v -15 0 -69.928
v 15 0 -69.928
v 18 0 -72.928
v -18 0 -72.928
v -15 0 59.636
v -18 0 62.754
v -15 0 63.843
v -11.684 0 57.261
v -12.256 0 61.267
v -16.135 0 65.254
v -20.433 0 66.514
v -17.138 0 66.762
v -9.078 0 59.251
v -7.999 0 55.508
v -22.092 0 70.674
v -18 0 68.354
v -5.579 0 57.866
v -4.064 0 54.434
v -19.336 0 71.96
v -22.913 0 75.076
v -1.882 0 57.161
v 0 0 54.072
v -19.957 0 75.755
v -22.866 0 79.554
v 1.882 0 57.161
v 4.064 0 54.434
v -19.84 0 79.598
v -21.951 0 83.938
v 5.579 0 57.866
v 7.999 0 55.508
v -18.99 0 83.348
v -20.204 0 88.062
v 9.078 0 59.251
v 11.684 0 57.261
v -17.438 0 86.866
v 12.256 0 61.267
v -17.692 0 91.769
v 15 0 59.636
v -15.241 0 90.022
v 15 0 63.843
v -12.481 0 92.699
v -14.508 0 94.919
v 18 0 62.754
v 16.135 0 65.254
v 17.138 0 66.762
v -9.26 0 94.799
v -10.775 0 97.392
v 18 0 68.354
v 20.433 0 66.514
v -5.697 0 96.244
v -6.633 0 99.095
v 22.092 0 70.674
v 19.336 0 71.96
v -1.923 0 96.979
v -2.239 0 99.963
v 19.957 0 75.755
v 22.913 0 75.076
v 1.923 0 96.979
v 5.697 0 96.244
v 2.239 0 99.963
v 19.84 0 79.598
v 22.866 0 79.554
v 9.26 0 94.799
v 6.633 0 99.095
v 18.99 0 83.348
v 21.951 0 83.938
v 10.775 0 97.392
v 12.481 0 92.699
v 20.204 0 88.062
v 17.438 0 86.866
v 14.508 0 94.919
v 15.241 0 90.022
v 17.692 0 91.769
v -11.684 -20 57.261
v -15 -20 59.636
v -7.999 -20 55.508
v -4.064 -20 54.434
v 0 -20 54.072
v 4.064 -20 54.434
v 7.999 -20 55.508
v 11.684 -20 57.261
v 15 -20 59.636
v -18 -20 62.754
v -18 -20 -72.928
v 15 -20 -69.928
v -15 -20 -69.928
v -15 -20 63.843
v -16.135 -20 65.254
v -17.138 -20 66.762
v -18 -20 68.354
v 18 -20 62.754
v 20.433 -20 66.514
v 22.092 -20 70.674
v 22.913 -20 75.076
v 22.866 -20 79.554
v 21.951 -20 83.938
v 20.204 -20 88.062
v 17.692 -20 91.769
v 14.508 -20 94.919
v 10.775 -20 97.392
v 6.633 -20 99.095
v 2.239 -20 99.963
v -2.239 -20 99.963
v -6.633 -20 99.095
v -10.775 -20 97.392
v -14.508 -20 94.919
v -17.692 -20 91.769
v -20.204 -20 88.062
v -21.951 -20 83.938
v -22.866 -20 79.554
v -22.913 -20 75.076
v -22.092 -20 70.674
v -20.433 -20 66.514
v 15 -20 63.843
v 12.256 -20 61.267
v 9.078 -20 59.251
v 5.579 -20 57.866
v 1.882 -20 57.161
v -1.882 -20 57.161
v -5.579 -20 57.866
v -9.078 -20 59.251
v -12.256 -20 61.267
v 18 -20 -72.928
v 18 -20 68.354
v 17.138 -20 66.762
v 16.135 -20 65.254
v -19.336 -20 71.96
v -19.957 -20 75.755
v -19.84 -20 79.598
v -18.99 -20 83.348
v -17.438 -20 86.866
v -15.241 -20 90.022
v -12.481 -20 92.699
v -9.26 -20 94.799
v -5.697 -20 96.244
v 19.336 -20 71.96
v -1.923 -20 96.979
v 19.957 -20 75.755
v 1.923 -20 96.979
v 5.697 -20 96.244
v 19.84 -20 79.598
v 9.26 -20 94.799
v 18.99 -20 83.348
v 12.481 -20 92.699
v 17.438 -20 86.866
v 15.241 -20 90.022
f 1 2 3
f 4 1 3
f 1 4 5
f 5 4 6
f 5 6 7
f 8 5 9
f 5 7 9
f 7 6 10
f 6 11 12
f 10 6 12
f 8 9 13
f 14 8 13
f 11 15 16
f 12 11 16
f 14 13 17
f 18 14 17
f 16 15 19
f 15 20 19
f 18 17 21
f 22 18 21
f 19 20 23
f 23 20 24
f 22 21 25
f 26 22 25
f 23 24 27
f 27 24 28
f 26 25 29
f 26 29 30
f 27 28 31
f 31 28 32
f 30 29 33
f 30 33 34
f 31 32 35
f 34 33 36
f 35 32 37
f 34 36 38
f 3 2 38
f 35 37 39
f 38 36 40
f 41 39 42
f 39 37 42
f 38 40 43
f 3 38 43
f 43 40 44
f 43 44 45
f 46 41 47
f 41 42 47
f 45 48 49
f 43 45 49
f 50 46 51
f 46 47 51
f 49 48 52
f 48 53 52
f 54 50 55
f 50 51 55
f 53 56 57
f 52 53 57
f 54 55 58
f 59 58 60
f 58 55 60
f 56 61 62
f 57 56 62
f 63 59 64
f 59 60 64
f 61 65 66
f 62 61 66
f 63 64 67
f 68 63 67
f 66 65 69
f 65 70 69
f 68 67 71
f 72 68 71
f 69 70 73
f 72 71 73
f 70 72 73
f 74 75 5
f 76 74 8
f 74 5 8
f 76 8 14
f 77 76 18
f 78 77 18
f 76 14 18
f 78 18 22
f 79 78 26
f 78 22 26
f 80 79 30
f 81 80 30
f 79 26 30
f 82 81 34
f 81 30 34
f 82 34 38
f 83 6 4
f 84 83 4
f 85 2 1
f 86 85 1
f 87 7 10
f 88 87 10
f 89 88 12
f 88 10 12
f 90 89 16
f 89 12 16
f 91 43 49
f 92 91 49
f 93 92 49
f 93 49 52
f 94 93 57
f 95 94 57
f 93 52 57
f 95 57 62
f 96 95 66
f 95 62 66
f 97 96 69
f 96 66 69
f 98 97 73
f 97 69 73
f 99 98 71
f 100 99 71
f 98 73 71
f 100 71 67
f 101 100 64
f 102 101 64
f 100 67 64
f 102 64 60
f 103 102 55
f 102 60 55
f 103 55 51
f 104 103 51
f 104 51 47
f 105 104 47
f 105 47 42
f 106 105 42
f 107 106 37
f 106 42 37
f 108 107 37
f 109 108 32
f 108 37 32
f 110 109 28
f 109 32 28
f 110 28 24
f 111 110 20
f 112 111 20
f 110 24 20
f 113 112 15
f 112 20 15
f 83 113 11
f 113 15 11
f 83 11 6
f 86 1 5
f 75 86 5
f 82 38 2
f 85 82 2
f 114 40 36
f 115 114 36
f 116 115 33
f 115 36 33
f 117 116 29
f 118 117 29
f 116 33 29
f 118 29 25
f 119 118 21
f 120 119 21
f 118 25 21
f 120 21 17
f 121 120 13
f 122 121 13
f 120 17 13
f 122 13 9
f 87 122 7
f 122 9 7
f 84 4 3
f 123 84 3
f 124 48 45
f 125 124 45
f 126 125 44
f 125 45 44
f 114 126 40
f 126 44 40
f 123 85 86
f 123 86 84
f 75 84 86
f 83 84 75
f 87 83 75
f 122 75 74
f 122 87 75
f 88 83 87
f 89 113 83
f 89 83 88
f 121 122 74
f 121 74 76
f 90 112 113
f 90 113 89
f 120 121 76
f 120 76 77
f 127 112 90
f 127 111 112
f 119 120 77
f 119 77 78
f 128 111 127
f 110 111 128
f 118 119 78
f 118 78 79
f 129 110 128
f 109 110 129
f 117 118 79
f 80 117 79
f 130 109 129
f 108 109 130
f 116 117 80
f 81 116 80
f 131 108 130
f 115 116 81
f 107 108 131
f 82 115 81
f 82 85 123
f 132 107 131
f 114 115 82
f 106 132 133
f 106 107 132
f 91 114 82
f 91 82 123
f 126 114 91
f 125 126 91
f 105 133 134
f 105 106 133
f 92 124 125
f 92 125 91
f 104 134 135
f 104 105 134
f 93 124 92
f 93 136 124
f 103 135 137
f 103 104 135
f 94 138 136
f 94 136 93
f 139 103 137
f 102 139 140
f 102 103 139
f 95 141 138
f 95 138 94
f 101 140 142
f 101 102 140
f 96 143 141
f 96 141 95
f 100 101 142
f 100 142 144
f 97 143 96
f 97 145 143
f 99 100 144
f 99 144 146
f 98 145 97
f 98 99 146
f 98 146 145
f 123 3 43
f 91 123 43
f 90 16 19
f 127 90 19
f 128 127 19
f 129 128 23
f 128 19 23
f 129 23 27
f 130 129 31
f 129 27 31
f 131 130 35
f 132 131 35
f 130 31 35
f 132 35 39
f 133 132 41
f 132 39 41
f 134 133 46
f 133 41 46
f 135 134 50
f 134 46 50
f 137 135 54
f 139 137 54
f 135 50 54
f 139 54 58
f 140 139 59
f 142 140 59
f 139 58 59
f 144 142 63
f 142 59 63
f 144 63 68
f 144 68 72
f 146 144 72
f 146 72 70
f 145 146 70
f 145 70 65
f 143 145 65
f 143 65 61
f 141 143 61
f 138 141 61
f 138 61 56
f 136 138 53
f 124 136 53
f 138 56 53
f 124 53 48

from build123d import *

# Parameters (mm, degrees)
F1_DEPTH = 20


# Not quite as in the source:
# - a feature names something its author has since deleted; it is built from what else it names


with BuildPart() as f1:
    # F0 (on Front) → F1 (new body)
    with BuildSketch(Plane.XZ):
        with BuildLine():
            ThreePointArc((-18, 68.354232338), (-4.472135955, 96.5656189147), (20, 77.072030225))
            ThreePointArc((20, 77.072030225), (19.4935886896, 72.59989427), (18, 68.354232338))
            Line((18, 68.354232338), (18, 62.7542091618))
            ThreePointArc((18, 62.7542091618), (21.7140507506, 69.489154781), (23, 77.072030225))
            ThreePointArc((23, 77.072030225), (-7.5828754441, 98.7860809757), (-18, 62.7542091618))
            Line((-18, 62.7542091618), (-18, 68.354232338))
        make_face()
        with BuildLine():
            ThreePointArc((-15, 63.8432736697), (-16.6534436987, 65.9967057163), (-18, 68.354232338))
            Line((-18, 68.354232338), (-18, 62.7542091618))
            ThreePointArc((-18, 62.7542091618), (-16.5734766958, 61.1246207109), (-15, 59.6364344509))
            Line((-15, 59.6364344509), (-15, 63.8432736697))
        make_face()
        with BuildLine():
            Line((18, 62.7542091618), (18, 68.354232338))
            ThreePointArc((18, 68.354232338), (16.6534436987, 65.9967057163), (15, 63.8432736697))
            Line((15, 63.8432736697), (15, 59.6364344509))
            ThreePointArc((15, 59.6364344509), (16.5734766958, 61.1246207109), (18, 62.7542091618))
        make_face()
        with BuildLine():
            ThreePointArc((15, 63.8432736697), (0, 57.072030225), (-15, 63.8432736697))
            Line((-15, 63.8432736697), (-15, 59.6364344509))
            ThreePointArc((-15, 59.6364344509), (0, 54.072030225), (15, 59.6364344509))
            Line((15, 59.6364344509), (15, 63.8432736697))
        make_face()
        with BuildLine():
            ThreePointArc((-15, 59.6364344509), (-16.5734766958, 61.1246207109), (-18, 62.7542091618))
            Line((-18, 62.7542091618), (-18, -72.927969775))
            Line((-18, -72.927969775), (18, -72.927969775))
            Line((18, -72.927969775), (18, 62.7542091618))
            ThreePointArc((18, 62.7542091618), (16.5734766958, 61.1246207109), (15, 59.6364344509))
            Line((15, 59.6364344509), (15, -69.927969775))
            Line((15, -69.927969775), (-15, -69.927969775))
            Line((-15, -69.927969775), (-15, 59.6364344509))
        make_face()
    extrude(amount=F1_DEPTH)


solid = f1.part
